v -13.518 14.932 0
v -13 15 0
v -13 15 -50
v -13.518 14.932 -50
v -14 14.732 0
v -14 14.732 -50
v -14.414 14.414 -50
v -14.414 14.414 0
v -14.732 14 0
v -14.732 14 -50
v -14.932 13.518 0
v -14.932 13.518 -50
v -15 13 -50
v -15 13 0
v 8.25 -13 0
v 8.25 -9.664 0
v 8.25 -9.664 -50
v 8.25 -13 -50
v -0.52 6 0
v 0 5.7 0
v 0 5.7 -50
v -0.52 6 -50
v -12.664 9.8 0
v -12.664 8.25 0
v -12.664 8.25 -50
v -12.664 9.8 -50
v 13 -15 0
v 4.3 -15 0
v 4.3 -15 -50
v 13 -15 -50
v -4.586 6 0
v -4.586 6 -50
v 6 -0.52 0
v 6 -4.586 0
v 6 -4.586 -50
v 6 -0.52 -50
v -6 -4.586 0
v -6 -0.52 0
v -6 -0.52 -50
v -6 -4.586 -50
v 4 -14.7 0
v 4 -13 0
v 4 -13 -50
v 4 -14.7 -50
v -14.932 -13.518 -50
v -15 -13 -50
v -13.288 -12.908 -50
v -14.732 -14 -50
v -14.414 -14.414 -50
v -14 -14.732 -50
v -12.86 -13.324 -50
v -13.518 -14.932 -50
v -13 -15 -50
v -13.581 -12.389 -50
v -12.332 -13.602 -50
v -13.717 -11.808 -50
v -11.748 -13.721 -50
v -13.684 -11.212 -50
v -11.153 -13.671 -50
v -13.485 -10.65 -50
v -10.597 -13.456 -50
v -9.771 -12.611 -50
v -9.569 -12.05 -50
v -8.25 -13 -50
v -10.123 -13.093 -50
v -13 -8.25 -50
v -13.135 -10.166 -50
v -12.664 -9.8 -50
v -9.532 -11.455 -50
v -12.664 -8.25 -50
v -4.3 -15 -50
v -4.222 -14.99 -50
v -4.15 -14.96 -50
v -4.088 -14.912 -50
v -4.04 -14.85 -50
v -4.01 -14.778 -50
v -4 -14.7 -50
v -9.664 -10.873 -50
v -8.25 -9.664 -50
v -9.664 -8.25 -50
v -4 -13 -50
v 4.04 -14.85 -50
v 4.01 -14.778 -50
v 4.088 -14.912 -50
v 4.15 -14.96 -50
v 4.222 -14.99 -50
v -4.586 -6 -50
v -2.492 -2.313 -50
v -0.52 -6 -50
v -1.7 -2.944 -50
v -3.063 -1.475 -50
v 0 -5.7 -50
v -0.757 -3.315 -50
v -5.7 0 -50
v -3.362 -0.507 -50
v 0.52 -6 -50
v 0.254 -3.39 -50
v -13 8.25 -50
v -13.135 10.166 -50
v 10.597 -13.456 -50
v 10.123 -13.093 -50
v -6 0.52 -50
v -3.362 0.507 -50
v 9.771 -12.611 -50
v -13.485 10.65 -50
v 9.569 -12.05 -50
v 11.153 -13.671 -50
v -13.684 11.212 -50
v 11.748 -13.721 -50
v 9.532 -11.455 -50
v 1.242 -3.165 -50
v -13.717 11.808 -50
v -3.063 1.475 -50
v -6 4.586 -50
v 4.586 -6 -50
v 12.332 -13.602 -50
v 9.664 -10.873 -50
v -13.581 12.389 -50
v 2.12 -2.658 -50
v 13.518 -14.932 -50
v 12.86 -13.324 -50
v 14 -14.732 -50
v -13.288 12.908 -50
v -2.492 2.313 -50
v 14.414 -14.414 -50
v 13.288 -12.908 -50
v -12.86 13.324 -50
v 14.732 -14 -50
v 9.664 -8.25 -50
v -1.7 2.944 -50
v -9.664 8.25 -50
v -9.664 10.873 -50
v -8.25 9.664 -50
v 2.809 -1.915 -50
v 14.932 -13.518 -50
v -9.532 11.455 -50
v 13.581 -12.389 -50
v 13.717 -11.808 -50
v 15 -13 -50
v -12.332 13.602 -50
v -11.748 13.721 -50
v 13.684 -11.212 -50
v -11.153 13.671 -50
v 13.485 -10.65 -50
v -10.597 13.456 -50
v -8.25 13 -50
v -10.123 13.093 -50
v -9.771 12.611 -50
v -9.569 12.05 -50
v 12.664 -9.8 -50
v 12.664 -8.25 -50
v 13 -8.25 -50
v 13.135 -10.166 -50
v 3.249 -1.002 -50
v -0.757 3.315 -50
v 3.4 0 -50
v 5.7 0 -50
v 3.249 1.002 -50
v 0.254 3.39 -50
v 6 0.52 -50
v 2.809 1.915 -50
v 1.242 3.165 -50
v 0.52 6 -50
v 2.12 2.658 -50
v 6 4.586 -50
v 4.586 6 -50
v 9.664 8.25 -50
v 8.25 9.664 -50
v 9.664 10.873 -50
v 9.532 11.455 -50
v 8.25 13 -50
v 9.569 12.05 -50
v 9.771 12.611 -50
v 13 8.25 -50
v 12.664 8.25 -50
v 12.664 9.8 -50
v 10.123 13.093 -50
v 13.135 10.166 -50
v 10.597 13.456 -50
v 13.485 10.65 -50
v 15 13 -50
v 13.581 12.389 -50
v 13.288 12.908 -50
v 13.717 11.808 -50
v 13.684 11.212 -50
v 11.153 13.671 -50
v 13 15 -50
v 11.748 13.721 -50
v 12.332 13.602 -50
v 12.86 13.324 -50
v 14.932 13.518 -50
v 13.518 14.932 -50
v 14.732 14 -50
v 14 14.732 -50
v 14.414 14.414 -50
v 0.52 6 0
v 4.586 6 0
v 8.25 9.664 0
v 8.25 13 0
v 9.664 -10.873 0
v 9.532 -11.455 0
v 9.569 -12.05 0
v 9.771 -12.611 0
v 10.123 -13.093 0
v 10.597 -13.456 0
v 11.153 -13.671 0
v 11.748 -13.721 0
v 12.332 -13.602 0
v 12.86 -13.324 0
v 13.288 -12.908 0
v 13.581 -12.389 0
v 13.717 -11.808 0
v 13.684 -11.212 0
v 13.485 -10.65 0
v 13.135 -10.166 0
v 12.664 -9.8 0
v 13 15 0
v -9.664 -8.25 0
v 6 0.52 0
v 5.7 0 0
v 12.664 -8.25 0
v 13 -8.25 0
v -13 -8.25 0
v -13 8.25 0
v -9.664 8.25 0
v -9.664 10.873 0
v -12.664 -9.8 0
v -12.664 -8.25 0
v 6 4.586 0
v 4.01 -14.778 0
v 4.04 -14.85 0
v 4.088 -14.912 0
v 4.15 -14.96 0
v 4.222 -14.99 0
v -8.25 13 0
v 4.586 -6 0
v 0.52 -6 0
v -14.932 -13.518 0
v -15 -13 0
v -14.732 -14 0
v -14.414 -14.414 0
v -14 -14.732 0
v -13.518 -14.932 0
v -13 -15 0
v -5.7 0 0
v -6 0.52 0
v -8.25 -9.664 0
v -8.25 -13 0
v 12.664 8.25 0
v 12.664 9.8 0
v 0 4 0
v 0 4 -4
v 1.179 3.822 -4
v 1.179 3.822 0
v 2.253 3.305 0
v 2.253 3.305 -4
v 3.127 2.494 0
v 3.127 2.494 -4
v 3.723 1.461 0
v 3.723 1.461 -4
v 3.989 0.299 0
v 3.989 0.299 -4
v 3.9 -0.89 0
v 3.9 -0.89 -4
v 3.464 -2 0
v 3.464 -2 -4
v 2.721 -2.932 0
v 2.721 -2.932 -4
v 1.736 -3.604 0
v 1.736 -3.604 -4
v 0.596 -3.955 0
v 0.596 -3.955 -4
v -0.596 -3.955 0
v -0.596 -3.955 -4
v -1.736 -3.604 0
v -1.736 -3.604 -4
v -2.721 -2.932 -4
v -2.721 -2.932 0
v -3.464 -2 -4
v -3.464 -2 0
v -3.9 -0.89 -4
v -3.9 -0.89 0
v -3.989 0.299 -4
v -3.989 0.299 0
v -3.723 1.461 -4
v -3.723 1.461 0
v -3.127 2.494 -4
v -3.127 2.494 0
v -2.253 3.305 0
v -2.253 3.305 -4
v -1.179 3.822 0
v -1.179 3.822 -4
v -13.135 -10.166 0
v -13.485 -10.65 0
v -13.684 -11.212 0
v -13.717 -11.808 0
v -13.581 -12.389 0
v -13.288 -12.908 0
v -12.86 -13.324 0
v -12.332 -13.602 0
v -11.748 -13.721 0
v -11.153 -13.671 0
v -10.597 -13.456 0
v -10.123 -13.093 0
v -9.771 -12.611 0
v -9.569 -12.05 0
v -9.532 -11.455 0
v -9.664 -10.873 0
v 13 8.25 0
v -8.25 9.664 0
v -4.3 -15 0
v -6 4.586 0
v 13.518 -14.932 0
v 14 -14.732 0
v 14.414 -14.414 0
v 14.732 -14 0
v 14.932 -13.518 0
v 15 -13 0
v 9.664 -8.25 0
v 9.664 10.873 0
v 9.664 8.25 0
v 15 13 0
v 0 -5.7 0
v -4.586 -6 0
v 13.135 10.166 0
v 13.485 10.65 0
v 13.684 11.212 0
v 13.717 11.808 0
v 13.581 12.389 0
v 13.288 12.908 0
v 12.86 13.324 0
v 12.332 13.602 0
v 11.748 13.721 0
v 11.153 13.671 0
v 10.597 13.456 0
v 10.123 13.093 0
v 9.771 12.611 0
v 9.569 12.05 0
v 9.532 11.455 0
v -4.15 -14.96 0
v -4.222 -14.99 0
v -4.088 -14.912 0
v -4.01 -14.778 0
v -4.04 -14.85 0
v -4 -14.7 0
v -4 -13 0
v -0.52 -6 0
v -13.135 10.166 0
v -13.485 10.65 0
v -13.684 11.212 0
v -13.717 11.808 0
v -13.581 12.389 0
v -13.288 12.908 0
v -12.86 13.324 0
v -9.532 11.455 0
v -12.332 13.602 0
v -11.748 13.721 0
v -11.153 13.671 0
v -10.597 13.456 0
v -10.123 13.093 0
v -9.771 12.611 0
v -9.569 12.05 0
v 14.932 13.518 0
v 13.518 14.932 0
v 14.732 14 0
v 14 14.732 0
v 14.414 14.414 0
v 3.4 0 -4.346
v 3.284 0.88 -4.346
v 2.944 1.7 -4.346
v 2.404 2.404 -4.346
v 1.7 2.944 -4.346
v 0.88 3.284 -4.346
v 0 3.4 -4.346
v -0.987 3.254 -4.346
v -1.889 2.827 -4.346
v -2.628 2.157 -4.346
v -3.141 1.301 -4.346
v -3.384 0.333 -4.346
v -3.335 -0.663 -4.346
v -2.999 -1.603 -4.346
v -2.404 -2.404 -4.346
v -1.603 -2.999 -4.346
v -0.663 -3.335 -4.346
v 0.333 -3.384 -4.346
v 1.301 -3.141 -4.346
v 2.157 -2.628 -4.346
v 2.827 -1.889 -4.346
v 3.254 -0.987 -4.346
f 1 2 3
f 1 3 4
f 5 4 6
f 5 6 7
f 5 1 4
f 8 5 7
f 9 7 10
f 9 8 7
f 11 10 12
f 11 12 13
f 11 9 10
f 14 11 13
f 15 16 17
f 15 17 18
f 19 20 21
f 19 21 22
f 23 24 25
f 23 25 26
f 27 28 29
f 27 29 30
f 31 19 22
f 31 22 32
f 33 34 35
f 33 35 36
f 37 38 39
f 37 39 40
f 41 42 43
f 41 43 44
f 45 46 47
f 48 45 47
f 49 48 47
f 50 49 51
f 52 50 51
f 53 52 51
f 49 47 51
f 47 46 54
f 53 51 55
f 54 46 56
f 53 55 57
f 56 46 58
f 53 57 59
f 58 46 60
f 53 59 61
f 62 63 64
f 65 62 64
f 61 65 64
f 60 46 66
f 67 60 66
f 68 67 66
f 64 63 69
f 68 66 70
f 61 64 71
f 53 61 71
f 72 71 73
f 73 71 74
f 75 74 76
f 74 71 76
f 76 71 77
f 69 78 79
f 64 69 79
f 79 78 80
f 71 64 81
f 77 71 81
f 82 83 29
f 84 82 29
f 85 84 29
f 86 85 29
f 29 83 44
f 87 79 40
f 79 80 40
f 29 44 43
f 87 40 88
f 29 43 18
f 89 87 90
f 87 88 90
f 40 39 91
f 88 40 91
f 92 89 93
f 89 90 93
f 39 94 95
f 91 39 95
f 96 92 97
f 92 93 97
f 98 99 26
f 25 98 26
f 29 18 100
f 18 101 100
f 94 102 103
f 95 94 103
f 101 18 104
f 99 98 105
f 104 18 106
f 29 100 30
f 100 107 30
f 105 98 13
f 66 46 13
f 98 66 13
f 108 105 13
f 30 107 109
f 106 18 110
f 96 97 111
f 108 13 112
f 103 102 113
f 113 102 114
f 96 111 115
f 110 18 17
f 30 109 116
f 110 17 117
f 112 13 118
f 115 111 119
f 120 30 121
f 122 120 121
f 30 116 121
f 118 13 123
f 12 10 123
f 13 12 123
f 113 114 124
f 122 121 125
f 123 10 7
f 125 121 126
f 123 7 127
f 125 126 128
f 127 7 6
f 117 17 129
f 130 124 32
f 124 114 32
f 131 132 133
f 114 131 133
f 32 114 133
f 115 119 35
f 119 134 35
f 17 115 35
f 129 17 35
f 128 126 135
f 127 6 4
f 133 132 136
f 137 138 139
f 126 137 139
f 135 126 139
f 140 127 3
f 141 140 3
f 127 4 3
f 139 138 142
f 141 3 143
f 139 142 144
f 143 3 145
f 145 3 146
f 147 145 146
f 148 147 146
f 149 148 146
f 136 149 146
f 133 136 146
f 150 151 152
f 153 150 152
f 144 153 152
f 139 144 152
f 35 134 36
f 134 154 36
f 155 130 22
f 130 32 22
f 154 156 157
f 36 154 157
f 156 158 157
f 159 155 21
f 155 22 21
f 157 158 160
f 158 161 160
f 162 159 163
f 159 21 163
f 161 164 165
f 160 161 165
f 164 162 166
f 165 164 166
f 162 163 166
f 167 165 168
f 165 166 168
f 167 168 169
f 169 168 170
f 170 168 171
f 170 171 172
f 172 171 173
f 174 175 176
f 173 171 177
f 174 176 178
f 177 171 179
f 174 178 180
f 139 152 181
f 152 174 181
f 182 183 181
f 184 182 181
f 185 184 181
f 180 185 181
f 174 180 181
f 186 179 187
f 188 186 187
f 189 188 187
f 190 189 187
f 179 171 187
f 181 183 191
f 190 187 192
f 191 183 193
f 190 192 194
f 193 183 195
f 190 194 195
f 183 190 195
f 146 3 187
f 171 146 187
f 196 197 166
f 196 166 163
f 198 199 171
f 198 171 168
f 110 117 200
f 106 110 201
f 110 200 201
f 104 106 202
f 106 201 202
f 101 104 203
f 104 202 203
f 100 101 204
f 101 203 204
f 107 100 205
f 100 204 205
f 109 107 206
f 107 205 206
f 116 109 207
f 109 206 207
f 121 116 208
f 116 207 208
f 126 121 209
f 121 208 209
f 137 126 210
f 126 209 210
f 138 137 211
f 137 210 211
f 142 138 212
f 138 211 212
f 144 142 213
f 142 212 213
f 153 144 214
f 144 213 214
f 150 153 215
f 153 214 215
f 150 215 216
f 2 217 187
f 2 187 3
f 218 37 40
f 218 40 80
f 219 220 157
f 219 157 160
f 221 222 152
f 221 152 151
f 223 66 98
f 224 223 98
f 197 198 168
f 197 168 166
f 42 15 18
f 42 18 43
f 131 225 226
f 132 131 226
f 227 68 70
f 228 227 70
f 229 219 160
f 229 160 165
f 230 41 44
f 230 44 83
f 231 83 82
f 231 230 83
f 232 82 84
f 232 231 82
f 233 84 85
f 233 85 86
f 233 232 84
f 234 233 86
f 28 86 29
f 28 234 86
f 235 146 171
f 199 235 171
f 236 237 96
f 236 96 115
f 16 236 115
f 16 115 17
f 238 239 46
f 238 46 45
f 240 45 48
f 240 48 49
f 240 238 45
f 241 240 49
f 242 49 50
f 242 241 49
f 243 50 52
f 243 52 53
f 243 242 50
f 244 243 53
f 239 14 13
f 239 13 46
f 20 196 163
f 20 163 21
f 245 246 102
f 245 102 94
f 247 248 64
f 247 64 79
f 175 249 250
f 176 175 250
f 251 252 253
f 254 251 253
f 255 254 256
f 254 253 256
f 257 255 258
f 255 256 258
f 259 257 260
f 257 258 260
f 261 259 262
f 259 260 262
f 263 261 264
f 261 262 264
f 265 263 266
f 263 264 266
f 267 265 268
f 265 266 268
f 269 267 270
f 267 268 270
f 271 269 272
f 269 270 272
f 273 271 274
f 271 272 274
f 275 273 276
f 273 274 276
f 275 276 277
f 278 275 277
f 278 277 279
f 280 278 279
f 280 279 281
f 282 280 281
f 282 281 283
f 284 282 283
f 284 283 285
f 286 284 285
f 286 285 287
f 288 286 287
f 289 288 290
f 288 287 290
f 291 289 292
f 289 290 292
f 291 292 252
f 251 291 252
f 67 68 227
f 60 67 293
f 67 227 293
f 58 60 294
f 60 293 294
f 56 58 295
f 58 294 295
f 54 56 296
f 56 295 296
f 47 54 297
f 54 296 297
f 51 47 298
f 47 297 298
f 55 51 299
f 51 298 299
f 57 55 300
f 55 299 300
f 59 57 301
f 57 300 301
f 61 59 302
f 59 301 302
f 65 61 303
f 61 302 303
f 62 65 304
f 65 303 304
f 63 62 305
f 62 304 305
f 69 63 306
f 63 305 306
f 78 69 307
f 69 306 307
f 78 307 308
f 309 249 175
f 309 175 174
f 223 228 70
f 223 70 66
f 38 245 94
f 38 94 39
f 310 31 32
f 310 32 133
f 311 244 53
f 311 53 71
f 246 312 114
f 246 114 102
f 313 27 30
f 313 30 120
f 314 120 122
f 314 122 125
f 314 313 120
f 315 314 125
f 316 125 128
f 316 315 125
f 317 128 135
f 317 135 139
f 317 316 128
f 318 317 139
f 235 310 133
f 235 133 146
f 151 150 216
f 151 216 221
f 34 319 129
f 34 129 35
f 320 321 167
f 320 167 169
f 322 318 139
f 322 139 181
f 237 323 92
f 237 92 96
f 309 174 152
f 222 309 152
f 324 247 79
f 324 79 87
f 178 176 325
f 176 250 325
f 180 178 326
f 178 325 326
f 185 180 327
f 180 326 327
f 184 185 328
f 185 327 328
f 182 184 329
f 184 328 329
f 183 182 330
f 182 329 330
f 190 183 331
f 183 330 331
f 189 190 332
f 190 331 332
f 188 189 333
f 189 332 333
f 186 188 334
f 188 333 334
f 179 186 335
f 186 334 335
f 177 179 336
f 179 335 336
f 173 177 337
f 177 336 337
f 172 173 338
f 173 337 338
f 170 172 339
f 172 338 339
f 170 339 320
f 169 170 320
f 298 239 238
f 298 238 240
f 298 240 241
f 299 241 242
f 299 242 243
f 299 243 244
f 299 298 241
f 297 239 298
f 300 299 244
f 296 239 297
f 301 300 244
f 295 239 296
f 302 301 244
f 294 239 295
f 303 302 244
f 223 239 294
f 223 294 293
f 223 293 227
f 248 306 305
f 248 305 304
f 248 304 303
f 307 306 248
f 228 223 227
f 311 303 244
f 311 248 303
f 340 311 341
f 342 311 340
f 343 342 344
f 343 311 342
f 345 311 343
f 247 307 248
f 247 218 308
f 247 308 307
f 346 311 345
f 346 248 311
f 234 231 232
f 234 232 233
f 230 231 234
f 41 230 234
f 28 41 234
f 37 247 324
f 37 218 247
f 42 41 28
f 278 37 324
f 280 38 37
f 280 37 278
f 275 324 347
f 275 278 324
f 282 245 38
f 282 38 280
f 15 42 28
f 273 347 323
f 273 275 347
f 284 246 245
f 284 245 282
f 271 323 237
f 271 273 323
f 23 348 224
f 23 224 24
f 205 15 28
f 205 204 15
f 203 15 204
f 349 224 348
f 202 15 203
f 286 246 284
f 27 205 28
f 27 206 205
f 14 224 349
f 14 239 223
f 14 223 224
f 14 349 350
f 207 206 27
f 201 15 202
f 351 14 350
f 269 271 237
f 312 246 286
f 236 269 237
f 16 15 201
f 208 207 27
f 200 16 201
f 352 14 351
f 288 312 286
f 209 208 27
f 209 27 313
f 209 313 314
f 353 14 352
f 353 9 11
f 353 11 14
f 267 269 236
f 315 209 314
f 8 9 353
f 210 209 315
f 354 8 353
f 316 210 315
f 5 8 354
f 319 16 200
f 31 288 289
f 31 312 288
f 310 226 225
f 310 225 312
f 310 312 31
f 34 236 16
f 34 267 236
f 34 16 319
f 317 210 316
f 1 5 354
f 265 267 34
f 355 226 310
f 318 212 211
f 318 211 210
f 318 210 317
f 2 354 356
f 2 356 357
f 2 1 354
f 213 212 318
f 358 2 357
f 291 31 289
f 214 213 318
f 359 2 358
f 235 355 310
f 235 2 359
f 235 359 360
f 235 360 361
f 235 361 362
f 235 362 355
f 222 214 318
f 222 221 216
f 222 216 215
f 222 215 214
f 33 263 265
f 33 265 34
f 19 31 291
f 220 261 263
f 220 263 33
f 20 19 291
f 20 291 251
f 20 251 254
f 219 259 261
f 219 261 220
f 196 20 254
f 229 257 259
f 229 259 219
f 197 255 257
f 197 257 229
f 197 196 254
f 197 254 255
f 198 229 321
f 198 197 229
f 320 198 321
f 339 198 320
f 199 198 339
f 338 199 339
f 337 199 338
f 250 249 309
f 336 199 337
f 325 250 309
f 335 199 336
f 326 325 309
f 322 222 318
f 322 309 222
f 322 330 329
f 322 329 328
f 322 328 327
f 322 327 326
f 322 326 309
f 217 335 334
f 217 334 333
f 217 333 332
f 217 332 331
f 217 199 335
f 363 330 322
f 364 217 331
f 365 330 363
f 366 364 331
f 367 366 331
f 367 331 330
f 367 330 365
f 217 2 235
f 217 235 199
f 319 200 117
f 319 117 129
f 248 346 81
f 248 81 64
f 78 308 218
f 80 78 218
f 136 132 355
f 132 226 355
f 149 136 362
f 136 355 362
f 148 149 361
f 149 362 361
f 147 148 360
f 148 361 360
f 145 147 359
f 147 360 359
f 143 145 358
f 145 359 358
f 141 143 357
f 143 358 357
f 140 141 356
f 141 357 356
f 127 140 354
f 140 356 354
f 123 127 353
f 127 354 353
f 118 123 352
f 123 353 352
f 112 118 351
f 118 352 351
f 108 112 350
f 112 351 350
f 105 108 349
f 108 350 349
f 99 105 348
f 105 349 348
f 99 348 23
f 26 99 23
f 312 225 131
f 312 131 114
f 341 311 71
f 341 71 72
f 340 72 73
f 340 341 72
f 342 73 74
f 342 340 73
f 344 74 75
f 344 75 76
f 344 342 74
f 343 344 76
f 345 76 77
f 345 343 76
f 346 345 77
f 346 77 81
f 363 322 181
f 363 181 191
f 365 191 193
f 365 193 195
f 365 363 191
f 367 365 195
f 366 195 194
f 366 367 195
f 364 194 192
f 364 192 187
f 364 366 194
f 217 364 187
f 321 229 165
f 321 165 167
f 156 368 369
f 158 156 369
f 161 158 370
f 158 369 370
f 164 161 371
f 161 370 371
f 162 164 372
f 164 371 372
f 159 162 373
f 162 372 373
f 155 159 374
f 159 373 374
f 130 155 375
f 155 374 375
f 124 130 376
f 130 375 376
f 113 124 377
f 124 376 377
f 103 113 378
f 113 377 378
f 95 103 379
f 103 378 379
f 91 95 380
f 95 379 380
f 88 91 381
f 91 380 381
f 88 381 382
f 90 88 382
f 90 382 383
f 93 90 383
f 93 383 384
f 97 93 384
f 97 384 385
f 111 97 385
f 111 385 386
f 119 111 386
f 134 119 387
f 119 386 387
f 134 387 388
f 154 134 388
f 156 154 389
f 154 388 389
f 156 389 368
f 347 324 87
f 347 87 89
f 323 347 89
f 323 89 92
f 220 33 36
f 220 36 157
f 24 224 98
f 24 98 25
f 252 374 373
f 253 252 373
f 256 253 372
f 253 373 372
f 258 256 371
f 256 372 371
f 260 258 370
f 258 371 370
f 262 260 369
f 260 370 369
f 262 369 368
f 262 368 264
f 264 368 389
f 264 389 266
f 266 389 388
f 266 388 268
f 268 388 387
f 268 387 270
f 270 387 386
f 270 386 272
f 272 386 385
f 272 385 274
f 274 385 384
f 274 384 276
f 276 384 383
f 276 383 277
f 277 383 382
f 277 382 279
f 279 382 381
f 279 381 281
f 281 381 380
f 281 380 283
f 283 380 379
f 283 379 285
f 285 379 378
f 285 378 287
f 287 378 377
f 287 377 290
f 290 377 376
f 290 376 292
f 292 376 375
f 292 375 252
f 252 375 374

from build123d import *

# Parameters (mm, degrees)
SKETCH1_R           = 2.1
SKETCH1_R_2         = 3.4
BOSS_EXTRUDE1_DEPTH = 50
SKETCH3_W           = 2
SKETCH3_H           = 9.175206629
SKETCH3_W_2         = 11.07645362
SKETCH3_H_2         = 2
SKETCH3_H_3         = 11.915453224
BOSS_EXTRUDE2_DEPTH = 50
SKETCH4_W           = 3
SKETCH4_H           = 21.746320034
CUT_EXTRUDE1_DEPTH  = 51


with BuildPart() as part:
    # Sketch1 → Boss-Extrude1 (new body)
    with BuildSketch(Plane.XY):
        with BuildLine():
            Line((-15, 13), (-15, 4.3))
            ThreePointArc((-15, 4.3), (-14.912132034, 4.087867966), (-14.7, 4))
            Line((-14.7, 4), (-13, 4))
            Line((-13, 4), (-13, 8.25))
            Line((-13, 8.25), (-9.6642, 8.25))
            Line((-9.6642, 8.25), (-6, 4.5858))
            Line((-6, 4.5858), (-6, 0.519615242))
            Line((-6, 0.519615242), (-5.7, 0))
            Line((-5.7, 0), (-6, -0.519615242))
            Line((-6, -0.519615242), (-6, -4.5858))
            Line((-6, -4.5858), (-9.6642, -8.25))
            Line((-9.6642, -8.25), (-13, -8.25))
            Line((-13, -8.25), (-13, -4))
            Line((-13, -4), (-14.7, -4))
            ThreePointArc((-14.7, -4), (-14.912132034, -4.087867966), (-15, -4.3))
            Line((-15, -4.3), (-15, -13))
            ThreePointArc((-15, -13), (-14.414213562, -14.414213562), (-13, -15))
            Line((-13, -15), (-4.3, -15))
            ThreePointArc((-4.3, -15), (-4.087867966, -14.912132034), (-4, -14.7))
            Line((-4, -14.7), (-4, -13))
            Line((-4, -13), (-8.25, -13))
            Line((-8.25, -13), (-8.25, -9.6642))
            Line((-8.25, -9.6642), (-4.5858, -6))
            Line((-4.5858, -6), (-0.519615242, -6))
            Line((-0.519615242, -6), (0, -5.7))
            Line((0, -5.7), (0.519615242, -6))
            Line((0.519615242, -6), (4.5858, -6))
            Line((4.5858, -6), (8.25, -9.6642))
            Line((8.25, -9.6642), (8.25, -13))
            Line((8.25, -13), (4, -13))
            Line((4, -13), (4, -14.7))
            ThreePointArc((4, -14.7), (4.087867966, -14.912132034), (4.3, -15))
            Line((4.3, -15), (13, -15))
            ThreePointArc((13, -15), (14.414213562, -14.414213562), (15, -13))
            Line((15, -13), (15, -4.3))
            ThreePointArc((15, -4.3), (14.912132034, -4.087867966), (14.7, -4))
            Line((14.7, -4), (13, -4))
            Line((13, -4), (13, -8.25))
            Line((13, -8.25), (9.6642, -8.25))
            Line((9.6642, -8.25), (6, -4.5858))
            Line((6, -4.5858), (6, -0.519615242))
            Line((6, -0.519615242), (5.7, 0))
            Line((5.7, 0), (6, 0.519615242))
            Line((6, 0.519615242), (6, 4.5858))
            Line((6, 4.5858), (9.6642, 8.25))
            Line((9.6642, 8.25), (13, 8.25))
            Line((13, 8.25), (13, 4))
            Line((13, 4), (14.7, 4))
            ThreePointArc((14.7, 4), (14.912132034, 4.087867966), (15, 4.3))
            Line((15, 4.3), (15, 13))
            ThreePointArc((15, 13), (14.414213562, 14.414213562), (13, 15))
            Line((13, 15), (4.3, 15))
            ThreePointArc((4.3, 15), (4.087867966, 14.912132034), (4, 14.7))
            Line((4, 14.7), (4, 13))
            Line((4, 13), (8.25, 13))
            Line((8.25, 13), (8.25, 9.6642))
            Line((8.25, 9.6642), (4.5858, 6))
            Line((4.5858, 6), (0.519615242, 6))
            Line((0.519615242, 6), (0, 5.7))
            Line((0, 5.7), (-0.519615242, 6))
            Line((-0.519615242, 6), (-4.5858, 6))
            Line((-4.5858, 6), (-8.25, 9.6642))
            Line((-8.25, 9.6642), (-8.25, 13))
            Line((-8.25, 13), (-4, 13))
            Line((-4, 13), (-4, 14.7))
            ThreePointArc((-4, 14.7), (-4.087867966, 14.912132034), (-4.3, 15))
            Line((-4.3, 15), (-13, 15))
            ThreePointArc((-13, 15), (-14.414213562, 14.414213562), (-15, 13))
        make_face()
        with Locations((11.625, -11.625)):
            Circle(SKETCH1_R, mode=Mode.SUBTRACT)
        with Locations((11.625, 11.625)):
            Circle(SKETCH1_R, mode=Mode.SUBTRACT)
        Circle(SKETCH1_R_2, mode=Mode.SUBTRACT)
        with Locations((-11.625, -11.625)):
            Circle(SKETCH1_R, mode=Mode.SUBTRACT)
        with Locations((-11.625, 11.625)):
            Circle(SKETCH1_R, mode=Mode.SUBTRACT)
    extrude(amount=-BOSS_EXTRUDE1_DEPTH)

    # Sketch2 → Cut-Revolve1 (revolve, cut)
    with BuildSketch(Plane(origin=(0, 0, 0), x_dir=(-1, 0, 0), z_dir=(0, 1, 0))):
        Polygon((0, -28.31882362), (-3.3235, -26.4), (-3.3235, -0.6765), (-4, 0), (0, 0), align=None)
    revolve(axis=Axis((0, 0, 0), (0, 0, -1)), mode=Mode.SUBTRACT)

    # Sketch3 → Boss-Extrude2 (add)
    with BuildSketch(Plane.XY):
        with Locations((-14, -0.287603314)):
            Rectangle(SKETCH3_W, SKETCH3_H)
        with Locations((-0.643781897, 14)):
            Rectangle(SKETCH3_W_2, SKETCH3_H_2)
        with Locations((14, -0.392977161)):
            Rectangle(SKETCH3_W, SKETCH3_H_3)
    extrude(amount=-BOSS_EXTRUDE2_DEPTH)

    # Sketch4 → Cut-Extrude1 (cut, through all)
    with BuildSketch(Plane.XY):
        with Locations((11.1642, 0)):
            Rectangle(SKETCH4_W, SKETCH4_H)
        with Locations((-11.1642, 0)):
            Rectangle(SKETCH4_W, SKETCH4_H)
    extrude(amount=-CUT_EXTRUDE1_DEPTH, mode=Mode.SUBTRACT)

    # Sketch5 → Cut-Revolve5 (revolve, cut)
    with BuildSketch(Plane(origin=(0, 0, 0), x_dir=(0, 0, -1), z_dir=(1, 0, 0))):
        Polygon((0, 0), (0, 4), (4, 4), (6.309401077, 0), align=None)
    revolve(axis=Axis((0, 0, 0), (0, 0, -1)), mode=Mode.SUBTRACT)


solid = part.part
